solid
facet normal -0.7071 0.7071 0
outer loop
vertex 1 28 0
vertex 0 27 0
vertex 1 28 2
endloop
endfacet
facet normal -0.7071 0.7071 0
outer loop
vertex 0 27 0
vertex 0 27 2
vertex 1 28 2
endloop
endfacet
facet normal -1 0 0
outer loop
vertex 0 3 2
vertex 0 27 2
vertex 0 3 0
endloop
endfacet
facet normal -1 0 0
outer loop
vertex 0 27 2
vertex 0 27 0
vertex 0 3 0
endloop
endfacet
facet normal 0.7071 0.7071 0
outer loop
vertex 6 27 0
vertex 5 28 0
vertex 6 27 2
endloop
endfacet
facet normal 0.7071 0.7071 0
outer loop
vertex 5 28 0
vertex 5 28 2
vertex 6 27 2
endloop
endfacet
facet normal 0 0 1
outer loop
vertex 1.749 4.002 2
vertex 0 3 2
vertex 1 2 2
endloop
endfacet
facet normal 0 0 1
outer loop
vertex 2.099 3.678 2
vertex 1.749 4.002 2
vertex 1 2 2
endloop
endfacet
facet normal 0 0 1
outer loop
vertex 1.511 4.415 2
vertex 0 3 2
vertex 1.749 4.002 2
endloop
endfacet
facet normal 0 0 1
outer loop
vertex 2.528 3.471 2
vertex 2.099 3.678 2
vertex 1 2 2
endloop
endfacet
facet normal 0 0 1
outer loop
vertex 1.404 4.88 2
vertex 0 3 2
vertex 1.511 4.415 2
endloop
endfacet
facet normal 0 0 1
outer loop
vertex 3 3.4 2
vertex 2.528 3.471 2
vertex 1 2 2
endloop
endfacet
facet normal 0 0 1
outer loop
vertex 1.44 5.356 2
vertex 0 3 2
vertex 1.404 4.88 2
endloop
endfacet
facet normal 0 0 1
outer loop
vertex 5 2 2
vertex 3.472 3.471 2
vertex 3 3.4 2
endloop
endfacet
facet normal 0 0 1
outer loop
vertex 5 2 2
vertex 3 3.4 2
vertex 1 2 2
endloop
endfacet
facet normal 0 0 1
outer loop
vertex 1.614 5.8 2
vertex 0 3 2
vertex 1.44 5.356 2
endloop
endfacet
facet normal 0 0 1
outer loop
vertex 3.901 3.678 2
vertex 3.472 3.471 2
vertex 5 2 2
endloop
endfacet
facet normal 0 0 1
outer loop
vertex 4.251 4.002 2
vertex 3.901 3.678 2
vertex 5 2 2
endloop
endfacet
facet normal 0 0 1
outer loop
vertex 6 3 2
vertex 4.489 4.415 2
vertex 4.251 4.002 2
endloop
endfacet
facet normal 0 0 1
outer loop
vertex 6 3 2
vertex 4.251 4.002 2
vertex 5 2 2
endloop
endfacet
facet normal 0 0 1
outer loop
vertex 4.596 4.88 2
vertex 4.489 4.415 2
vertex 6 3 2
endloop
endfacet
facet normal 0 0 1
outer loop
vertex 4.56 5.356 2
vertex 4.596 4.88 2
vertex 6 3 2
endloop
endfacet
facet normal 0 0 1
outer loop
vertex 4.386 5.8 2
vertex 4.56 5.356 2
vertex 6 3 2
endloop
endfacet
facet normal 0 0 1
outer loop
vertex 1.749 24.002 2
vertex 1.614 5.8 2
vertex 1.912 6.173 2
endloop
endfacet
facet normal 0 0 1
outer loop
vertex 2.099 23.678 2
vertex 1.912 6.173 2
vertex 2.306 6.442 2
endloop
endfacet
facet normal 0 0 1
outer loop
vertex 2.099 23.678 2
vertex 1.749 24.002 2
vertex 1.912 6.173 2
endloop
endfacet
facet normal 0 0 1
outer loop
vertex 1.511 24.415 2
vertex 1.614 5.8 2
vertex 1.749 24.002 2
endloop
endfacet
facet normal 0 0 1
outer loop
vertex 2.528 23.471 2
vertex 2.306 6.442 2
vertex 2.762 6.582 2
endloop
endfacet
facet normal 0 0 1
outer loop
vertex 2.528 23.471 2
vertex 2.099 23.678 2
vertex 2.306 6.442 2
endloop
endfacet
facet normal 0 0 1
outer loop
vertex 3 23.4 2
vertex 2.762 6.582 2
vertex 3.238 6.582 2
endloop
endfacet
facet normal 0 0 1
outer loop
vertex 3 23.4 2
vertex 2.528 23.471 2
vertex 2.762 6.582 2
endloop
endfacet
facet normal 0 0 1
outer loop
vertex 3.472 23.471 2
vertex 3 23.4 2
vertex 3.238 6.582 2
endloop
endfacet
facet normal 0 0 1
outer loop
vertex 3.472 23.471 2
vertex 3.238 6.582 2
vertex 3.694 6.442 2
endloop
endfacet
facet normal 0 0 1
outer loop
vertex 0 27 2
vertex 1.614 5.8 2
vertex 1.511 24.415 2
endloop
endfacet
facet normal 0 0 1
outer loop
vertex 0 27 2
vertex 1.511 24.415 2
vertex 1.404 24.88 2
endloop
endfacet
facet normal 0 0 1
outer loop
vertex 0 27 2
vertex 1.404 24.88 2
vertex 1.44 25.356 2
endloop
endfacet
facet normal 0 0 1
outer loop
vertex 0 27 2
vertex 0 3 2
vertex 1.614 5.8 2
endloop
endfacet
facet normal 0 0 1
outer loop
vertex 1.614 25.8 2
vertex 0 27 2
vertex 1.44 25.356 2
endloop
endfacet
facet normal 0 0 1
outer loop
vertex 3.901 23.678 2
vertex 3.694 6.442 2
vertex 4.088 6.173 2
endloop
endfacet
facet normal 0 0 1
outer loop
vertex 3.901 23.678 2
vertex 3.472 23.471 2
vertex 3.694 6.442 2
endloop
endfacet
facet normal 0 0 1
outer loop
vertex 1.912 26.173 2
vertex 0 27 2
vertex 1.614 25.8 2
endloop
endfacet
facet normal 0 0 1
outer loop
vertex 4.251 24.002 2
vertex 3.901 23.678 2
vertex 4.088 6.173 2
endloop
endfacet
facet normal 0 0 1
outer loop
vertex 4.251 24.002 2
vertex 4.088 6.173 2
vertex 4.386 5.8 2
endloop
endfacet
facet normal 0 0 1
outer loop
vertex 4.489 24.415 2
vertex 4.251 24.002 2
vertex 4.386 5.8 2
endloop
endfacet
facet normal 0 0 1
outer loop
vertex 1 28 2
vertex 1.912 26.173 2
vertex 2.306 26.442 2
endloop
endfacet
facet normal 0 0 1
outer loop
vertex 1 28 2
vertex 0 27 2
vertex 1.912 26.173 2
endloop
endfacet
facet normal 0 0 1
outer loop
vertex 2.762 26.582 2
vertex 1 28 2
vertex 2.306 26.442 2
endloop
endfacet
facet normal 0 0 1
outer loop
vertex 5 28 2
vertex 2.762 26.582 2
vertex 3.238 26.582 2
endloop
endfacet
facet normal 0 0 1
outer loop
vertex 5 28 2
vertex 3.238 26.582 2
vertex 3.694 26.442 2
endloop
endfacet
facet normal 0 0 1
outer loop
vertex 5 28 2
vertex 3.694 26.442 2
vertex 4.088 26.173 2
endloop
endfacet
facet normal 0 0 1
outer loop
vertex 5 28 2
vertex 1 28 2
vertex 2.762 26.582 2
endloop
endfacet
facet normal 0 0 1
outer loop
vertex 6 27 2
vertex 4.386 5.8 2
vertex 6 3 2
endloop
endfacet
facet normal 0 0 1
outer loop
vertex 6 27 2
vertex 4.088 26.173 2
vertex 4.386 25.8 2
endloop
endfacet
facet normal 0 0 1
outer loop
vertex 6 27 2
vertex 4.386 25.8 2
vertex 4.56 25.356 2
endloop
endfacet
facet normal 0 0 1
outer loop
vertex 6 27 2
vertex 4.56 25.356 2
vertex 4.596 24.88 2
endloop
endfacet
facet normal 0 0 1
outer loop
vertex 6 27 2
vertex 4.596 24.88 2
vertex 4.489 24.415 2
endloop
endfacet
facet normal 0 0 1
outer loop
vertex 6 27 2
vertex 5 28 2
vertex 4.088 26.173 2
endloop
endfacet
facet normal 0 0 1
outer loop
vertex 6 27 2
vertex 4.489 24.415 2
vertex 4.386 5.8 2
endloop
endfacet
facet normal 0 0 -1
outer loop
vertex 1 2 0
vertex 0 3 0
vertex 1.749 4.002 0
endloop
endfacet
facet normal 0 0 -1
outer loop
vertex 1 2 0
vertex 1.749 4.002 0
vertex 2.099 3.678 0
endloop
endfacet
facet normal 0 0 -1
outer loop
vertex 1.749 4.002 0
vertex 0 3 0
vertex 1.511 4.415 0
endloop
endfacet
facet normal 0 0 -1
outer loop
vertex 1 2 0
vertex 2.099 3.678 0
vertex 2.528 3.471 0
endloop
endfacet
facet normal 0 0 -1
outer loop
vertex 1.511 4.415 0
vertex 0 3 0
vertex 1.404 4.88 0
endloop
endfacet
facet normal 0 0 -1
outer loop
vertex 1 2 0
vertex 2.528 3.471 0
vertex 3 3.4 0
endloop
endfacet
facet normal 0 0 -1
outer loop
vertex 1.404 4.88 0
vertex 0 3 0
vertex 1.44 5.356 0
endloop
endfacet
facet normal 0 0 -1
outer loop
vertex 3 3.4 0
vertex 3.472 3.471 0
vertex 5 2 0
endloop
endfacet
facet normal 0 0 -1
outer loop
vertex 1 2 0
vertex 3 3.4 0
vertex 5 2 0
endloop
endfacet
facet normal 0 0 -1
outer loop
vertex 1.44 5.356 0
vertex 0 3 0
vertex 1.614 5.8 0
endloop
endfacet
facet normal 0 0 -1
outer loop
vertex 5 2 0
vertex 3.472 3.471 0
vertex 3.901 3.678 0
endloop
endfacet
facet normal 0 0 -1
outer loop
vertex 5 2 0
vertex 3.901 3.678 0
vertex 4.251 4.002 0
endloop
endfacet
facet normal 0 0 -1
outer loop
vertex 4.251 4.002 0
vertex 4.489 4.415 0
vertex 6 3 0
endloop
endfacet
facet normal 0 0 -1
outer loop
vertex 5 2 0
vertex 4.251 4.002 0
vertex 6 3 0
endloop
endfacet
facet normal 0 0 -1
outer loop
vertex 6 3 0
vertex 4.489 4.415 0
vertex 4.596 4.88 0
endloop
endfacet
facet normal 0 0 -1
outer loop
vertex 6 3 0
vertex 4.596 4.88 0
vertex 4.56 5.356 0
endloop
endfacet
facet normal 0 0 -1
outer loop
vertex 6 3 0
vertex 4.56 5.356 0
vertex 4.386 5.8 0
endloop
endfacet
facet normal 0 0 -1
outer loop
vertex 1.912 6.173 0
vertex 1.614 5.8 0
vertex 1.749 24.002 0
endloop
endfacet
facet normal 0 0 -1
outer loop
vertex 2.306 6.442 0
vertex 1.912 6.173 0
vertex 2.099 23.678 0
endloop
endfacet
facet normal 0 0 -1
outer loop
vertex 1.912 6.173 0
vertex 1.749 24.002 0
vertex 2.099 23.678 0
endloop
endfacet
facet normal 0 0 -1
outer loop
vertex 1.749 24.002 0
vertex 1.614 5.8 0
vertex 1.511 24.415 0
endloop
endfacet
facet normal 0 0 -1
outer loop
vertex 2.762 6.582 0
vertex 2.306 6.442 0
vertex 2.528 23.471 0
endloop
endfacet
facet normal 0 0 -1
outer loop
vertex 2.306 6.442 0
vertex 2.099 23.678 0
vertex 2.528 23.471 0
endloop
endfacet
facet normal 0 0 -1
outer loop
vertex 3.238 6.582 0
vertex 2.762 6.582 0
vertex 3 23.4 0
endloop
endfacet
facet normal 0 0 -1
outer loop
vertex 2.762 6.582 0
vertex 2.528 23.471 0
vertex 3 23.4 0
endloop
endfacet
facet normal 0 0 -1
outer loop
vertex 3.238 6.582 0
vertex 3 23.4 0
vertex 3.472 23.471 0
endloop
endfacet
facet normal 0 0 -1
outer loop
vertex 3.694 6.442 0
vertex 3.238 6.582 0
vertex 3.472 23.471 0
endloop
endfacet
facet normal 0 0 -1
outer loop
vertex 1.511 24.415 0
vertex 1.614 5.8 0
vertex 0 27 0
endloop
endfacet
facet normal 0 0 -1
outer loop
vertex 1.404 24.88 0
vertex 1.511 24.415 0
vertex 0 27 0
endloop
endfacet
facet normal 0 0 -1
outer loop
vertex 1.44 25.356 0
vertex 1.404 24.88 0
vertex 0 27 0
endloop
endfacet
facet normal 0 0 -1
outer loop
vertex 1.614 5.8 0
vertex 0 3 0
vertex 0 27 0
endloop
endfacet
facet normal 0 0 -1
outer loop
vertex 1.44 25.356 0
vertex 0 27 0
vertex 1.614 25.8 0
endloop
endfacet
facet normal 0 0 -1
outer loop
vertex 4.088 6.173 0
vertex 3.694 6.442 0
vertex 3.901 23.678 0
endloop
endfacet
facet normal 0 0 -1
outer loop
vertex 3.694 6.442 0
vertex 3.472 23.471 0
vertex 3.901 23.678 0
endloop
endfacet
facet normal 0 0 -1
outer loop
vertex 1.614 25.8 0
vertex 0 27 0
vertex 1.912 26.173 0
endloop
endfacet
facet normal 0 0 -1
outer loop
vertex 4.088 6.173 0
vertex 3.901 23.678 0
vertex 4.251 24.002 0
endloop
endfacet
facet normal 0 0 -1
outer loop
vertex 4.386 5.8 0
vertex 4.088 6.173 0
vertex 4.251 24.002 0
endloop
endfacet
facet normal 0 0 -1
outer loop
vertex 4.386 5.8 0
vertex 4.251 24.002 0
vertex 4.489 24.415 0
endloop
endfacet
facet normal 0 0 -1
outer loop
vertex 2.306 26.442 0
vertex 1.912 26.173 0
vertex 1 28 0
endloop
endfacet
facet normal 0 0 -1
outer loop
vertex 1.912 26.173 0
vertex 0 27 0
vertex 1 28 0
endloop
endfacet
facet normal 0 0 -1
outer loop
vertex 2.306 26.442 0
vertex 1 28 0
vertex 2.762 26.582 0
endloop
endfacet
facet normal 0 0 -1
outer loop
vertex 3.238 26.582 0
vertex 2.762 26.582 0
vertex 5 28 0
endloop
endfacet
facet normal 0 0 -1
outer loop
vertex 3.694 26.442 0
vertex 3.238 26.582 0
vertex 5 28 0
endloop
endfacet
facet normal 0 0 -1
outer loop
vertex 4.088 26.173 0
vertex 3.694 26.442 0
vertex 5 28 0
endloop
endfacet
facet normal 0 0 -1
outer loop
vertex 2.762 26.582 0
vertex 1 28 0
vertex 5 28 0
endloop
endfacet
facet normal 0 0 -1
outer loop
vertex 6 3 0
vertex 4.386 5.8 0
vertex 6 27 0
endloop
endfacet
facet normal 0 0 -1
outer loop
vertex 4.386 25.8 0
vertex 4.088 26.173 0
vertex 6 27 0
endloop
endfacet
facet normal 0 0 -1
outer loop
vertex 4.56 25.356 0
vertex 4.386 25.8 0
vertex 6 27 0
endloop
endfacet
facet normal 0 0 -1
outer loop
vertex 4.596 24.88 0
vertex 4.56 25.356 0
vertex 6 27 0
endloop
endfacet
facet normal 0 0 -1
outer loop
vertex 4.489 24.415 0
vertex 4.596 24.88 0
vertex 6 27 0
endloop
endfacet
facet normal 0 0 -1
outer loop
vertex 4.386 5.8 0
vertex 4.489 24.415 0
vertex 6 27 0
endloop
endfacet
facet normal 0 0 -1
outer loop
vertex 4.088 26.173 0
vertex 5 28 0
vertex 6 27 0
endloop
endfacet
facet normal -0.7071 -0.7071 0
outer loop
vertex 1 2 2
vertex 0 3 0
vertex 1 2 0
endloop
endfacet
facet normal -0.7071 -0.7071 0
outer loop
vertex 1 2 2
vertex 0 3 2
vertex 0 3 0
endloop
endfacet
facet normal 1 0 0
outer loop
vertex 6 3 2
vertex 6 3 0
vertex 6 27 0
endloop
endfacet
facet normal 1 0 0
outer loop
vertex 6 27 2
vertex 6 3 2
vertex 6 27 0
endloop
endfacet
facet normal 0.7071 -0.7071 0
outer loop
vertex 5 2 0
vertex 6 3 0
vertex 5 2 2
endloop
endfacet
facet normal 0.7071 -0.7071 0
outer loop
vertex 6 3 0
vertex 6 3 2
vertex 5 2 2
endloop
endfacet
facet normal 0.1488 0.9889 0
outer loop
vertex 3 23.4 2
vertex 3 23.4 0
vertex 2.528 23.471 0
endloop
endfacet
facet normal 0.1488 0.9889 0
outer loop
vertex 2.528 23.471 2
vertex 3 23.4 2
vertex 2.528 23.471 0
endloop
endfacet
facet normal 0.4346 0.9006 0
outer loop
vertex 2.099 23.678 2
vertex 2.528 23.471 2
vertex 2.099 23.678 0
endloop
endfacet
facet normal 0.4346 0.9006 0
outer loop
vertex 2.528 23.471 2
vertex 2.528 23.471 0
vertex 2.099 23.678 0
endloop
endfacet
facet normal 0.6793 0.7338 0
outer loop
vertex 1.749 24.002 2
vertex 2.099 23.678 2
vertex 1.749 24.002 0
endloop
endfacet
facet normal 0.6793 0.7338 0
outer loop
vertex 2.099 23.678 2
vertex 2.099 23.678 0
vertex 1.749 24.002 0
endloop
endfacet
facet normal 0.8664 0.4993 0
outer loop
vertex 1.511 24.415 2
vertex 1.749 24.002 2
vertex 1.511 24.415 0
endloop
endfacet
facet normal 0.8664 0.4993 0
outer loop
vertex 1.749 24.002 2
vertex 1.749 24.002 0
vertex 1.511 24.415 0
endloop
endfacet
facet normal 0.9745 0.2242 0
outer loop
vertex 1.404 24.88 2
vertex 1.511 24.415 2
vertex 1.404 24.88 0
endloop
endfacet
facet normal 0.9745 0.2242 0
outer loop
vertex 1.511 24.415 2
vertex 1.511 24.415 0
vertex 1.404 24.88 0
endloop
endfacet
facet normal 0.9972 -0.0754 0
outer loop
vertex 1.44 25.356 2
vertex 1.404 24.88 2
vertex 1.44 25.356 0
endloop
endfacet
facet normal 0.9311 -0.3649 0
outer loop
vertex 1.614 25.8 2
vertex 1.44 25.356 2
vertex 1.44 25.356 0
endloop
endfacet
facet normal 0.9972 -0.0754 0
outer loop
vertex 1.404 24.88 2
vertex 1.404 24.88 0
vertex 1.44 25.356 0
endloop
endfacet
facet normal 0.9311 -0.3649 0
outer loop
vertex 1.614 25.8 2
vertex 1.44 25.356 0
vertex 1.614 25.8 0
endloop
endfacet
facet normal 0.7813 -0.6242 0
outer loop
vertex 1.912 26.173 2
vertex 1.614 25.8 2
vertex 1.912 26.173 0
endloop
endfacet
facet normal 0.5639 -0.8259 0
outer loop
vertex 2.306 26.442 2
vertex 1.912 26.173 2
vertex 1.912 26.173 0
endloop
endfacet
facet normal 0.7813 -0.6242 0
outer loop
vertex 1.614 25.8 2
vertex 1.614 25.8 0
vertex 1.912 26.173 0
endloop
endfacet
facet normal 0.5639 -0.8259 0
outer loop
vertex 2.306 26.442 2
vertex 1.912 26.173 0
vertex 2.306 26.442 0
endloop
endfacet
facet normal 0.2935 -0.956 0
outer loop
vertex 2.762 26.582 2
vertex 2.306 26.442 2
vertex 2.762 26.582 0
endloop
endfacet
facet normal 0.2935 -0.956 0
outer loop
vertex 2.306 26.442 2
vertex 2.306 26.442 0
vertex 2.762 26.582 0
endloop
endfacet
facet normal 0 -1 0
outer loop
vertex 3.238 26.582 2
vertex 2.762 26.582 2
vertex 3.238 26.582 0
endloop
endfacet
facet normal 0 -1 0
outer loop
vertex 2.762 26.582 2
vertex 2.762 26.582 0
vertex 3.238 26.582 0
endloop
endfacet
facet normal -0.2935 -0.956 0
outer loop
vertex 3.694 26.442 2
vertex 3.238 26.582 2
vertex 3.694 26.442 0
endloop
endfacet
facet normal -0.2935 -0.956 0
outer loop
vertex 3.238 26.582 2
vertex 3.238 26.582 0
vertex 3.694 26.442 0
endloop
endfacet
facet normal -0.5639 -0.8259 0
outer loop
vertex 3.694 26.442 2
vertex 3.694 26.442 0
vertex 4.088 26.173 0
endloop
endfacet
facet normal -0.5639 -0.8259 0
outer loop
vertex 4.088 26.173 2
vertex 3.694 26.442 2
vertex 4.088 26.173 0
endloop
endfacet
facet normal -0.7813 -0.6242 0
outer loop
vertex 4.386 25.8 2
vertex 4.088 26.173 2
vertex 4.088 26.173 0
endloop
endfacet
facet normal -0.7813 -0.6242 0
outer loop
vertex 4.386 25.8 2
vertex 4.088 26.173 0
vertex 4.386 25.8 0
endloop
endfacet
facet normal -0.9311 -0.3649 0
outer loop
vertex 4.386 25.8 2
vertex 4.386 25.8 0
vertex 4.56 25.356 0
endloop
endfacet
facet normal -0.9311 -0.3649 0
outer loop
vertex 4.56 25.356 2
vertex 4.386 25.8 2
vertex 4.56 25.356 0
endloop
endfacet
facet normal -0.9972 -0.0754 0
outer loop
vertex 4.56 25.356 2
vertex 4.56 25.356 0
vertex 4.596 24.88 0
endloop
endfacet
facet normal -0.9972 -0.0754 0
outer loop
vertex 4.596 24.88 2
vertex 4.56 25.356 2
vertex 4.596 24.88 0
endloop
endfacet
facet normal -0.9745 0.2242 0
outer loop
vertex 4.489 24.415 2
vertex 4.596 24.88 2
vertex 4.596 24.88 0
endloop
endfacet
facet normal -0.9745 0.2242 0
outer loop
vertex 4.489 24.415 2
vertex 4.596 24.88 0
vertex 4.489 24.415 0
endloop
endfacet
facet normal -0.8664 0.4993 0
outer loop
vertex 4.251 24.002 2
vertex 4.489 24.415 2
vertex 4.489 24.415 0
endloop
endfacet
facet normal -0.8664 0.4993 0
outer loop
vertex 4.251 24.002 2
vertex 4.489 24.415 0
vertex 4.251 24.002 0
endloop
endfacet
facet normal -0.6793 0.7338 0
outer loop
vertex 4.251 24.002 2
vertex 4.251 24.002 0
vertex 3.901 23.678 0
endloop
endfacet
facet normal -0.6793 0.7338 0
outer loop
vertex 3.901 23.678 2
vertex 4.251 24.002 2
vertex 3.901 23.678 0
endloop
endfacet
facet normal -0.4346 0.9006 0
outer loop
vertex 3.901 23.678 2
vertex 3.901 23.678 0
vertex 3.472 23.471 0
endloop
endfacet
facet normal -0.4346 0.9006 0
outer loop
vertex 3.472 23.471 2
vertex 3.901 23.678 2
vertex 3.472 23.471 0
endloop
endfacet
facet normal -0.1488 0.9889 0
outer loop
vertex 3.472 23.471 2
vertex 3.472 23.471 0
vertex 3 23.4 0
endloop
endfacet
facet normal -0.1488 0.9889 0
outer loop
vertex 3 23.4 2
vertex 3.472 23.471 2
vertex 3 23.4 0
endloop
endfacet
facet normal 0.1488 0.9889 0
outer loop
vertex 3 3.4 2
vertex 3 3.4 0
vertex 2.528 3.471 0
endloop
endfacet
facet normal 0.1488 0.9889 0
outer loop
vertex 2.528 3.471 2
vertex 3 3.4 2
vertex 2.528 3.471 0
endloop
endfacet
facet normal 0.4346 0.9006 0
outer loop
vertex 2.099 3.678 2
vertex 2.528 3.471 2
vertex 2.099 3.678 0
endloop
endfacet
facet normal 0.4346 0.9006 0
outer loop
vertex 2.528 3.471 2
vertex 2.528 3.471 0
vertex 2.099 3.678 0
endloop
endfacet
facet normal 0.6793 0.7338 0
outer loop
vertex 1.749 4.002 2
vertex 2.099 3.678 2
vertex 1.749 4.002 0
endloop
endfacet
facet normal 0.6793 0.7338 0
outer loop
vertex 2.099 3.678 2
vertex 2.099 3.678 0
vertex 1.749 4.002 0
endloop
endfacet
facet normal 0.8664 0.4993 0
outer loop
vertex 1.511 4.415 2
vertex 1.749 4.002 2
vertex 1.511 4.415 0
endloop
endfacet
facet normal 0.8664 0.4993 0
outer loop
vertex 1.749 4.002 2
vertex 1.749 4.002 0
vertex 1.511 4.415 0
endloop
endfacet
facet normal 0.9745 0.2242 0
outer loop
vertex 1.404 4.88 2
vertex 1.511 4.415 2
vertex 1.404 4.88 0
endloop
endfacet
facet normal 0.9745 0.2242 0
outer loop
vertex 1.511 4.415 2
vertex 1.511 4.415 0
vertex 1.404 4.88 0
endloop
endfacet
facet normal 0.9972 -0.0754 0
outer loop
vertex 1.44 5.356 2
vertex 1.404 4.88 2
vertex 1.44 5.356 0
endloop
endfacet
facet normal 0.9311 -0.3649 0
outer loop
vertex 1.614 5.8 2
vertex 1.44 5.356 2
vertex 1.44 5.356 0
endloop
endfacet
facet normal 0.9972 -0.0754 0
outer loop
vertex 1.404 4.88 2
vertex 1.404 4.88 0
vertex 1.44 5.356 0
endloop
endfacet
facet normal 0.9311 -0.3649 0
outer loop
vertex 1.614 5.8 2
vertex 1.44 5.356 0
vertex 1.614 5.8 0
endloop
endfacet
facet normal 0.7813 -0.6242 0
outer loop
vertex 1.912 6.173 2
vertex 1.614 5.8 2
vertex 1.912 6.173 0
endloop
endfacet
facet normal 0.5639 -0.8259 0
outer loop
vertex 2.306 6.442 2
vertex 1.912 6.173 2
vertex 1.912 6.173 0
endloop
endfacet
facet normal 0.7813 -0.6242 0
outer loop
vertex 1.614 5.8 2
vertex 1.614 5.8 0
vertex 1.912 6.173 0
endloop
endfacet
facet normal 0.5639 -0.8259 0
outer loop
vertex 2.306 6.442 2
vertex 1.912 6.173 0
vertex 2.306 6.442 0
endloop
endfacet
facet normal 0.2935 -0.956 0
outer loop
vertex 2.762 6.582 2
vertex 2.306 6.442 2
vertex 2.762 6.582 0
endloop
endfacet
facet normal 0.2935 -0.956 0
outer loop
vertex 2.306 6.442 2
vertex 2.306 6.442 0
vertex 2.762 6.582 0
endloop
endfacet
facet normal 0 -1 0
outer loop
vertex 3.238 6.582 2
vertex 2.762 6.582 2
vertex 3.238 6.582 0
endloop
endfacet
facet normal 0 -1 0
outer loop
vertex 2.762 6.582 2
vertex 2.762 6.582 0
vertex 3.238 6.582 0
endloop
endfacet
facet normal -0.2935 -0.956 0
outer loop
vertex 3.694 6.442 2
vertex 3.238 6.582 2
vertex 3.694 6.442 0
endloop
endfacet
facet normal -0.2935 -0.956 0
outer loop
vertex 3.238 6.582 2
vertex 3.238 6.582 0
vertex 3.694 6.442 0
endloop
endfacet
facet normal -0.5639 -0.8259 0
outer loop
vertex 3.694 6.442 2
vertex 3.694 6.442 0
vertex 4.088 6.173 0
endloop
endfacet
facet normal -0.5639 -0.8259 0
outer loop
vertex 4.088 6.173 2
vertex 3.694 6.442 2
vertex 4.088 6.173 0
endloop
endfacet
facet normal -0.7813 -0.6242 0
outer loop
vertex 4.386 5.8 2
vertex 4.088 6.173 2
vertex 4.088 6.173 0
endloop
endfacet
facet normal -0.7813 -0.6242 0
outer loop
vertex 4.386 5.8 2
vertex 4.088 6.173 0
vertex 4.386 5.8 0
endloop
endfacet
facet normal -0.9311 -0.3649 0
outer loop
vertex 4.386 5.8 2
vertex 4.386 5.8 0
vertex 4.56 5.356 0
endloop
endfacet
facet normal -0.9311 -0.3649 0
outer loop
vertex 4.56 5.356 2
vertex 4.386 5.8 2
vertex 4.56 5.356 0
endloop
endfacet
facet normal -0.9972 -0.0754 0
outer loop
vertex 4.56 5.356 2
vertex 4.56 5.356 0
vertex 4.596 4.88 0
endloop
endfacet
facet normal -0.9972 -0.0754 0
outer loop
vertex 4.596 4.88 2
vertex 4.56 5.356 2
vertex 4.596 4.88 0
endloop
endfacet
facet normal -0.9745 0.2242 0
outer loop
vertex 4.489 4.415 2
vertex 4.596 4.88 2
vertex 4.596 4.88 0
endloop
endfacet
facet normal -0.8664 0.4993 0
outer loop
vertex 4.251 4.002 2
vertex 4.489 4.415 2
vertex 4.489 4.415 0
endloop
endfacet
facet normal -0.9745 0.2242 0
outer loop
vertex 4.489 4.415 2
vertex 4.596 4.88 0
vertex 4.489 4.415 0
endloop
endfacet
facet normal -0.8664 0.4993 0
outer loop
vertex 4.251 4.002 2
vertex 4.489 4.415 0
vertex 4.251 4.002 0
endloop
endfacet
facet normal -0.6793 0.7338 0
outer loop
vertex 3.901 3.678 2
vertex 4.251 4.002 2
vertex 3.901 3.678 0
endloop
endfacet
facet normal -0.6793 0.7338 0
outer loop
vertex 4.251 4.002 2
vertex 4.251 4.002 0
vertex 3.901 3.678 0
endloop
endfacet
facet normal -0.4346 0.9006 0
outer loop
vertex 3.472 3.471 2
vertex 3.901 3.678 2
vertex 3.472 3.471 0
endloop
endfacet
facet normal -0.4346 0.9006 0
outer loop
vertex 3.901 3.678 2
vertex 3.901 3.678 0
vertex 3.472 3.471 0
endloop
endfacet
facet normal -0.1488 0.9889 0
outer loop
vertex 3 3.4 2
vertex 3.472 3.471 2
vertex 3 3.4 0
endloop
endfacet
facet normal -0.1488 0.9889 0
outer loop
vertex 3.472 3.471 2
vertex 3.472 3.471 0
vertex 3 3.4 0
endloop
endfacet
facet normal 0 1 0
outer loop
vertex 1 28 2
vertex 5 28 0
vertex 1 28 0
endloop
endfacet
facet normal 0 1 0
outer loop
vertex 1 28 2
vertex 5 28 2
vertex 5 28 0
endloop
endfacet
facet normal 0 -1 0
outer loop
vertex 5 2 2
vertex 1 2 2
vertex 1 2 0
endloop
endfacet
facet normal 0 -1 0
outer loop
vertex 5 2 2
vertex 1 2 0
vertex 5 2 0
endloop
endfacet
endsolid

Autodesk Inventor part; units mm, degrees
ref_plane "YZ Plane" through (0, 0, 0) normal (1, 0, 0) x (0, 1, 0)
ref_plane "XZ Plane" through (0, 0, 0) normal (0, 1, 0) x (-1, 0, 0)
ref_plane "XY Plane" through (0, 0, 0) normal (0, 0, 1) x (1, 0, 0)
sketch "スケッチ1" plane through (0, 0, 0) normal (0, 0, 1) x (1, 0, 0)
  line L0 (0, 0) -> (6, 0)
  line L1 (6, 0) -> (6, 30)
  line L2 (6, 30) -> (0, 30)
  line L3 (0, 30) -> (0, 0)
  dimension "d0" = 6
  dimension "d1" = 30
extrude "押し出し1" add sketch "スケッチ1" along normal blind 2
sketch "スケッチ2" plane through (0, 0, 2) normal (0, 0, 1) x (1, 0, 0)
  line L0 (6, 30) -> (0, 30) projected
  line L1 (6, 0) -> (6, 30) projected
  line L2 (0, 0) -> (6, 0) projected
  point P0 (3, 25)
  point P1 (3, 5)
  dimension "d4" = 5
  dimension "d5" = 3
  dimension "d6" = 3
  dimension "d7" = 5
hole "穴1" at (3, 25, 2) at (3, 5, 2) direction (0, 0, -1) diameter 3.2 end through all
sketch "スケッチ4" plane through (0, 0, 2) normal (0, 0, 1) x (1, 0, 0)
  line L0 (6, 30) -> (0, 30) projected
  line L1 (6, 0) -> (6, 30) projected
  line L2 (0, 30) -> (6, 30)
  line L3 (6, 30) -> (6, 28)
  line L4 (6, 28) -> (0, 28)
  line L5 (0, 28) -> (0, 30)
  line L6 (0, 30) -> (0, 0) projected
  line L7 (0, 2) -> (6, 2)
  line L8 (6, 2) -> (6, 0)
  line L9 (6, 0) -> (0, 0)
  line L10 (0, 0) -> (0, 2)
  dimension "d18" = 2
  dimension "d19" = 2
extrude "押し出し2" cut sketch "スケッチ4" against normal blind 10 contours L1 L4 L5 L0 | L1 L9 L6 L7
sketch "スケッチ5" plane through (0, 0, 2) normal (0, 0, 1) x (1, 0, 0)
  line L0 (0, 28) -> (0, 2) projected
  line L1 (0, 27) -> (1, 28)
  line L2 (0, 28) -> (6, 28) projected
  line L3 (5, 28) -> (6, 27)
  line L4 (6, 2) -> (6, 28) projected
  point P0 (0, 0)
  dimension "d22" = 1
  dimension "d23" = 1
  dimension "d24" = 1
  dimension "d25" = 1
sketch "スケッチ6" plane through (0, 0, 2) normal (0, 0, 1) x (1, 0, 0)
  line L0 (0, 28) -> (0, 2) projected
  line L1 (0, 3) -> (1, 2)
  line L2 (6, 2) -> (0, 2) projected
  line L3 (6, 2) -> (6, 28) projected
  line L4 (6, 3) -> (5, 2)
  point P0 (0, 0)
  dimension "d26" = 1
  dimension "d27" = 1
  dimension "d28" = 1
  dimension "d29" = 1
extrude "押し出し3" cut sketch "スケッチ6" against normal blind 10
extrude "押し出し4" cut sketch "スケッチ5" against normal blind 10
properties part number "リンク26×6×2"
